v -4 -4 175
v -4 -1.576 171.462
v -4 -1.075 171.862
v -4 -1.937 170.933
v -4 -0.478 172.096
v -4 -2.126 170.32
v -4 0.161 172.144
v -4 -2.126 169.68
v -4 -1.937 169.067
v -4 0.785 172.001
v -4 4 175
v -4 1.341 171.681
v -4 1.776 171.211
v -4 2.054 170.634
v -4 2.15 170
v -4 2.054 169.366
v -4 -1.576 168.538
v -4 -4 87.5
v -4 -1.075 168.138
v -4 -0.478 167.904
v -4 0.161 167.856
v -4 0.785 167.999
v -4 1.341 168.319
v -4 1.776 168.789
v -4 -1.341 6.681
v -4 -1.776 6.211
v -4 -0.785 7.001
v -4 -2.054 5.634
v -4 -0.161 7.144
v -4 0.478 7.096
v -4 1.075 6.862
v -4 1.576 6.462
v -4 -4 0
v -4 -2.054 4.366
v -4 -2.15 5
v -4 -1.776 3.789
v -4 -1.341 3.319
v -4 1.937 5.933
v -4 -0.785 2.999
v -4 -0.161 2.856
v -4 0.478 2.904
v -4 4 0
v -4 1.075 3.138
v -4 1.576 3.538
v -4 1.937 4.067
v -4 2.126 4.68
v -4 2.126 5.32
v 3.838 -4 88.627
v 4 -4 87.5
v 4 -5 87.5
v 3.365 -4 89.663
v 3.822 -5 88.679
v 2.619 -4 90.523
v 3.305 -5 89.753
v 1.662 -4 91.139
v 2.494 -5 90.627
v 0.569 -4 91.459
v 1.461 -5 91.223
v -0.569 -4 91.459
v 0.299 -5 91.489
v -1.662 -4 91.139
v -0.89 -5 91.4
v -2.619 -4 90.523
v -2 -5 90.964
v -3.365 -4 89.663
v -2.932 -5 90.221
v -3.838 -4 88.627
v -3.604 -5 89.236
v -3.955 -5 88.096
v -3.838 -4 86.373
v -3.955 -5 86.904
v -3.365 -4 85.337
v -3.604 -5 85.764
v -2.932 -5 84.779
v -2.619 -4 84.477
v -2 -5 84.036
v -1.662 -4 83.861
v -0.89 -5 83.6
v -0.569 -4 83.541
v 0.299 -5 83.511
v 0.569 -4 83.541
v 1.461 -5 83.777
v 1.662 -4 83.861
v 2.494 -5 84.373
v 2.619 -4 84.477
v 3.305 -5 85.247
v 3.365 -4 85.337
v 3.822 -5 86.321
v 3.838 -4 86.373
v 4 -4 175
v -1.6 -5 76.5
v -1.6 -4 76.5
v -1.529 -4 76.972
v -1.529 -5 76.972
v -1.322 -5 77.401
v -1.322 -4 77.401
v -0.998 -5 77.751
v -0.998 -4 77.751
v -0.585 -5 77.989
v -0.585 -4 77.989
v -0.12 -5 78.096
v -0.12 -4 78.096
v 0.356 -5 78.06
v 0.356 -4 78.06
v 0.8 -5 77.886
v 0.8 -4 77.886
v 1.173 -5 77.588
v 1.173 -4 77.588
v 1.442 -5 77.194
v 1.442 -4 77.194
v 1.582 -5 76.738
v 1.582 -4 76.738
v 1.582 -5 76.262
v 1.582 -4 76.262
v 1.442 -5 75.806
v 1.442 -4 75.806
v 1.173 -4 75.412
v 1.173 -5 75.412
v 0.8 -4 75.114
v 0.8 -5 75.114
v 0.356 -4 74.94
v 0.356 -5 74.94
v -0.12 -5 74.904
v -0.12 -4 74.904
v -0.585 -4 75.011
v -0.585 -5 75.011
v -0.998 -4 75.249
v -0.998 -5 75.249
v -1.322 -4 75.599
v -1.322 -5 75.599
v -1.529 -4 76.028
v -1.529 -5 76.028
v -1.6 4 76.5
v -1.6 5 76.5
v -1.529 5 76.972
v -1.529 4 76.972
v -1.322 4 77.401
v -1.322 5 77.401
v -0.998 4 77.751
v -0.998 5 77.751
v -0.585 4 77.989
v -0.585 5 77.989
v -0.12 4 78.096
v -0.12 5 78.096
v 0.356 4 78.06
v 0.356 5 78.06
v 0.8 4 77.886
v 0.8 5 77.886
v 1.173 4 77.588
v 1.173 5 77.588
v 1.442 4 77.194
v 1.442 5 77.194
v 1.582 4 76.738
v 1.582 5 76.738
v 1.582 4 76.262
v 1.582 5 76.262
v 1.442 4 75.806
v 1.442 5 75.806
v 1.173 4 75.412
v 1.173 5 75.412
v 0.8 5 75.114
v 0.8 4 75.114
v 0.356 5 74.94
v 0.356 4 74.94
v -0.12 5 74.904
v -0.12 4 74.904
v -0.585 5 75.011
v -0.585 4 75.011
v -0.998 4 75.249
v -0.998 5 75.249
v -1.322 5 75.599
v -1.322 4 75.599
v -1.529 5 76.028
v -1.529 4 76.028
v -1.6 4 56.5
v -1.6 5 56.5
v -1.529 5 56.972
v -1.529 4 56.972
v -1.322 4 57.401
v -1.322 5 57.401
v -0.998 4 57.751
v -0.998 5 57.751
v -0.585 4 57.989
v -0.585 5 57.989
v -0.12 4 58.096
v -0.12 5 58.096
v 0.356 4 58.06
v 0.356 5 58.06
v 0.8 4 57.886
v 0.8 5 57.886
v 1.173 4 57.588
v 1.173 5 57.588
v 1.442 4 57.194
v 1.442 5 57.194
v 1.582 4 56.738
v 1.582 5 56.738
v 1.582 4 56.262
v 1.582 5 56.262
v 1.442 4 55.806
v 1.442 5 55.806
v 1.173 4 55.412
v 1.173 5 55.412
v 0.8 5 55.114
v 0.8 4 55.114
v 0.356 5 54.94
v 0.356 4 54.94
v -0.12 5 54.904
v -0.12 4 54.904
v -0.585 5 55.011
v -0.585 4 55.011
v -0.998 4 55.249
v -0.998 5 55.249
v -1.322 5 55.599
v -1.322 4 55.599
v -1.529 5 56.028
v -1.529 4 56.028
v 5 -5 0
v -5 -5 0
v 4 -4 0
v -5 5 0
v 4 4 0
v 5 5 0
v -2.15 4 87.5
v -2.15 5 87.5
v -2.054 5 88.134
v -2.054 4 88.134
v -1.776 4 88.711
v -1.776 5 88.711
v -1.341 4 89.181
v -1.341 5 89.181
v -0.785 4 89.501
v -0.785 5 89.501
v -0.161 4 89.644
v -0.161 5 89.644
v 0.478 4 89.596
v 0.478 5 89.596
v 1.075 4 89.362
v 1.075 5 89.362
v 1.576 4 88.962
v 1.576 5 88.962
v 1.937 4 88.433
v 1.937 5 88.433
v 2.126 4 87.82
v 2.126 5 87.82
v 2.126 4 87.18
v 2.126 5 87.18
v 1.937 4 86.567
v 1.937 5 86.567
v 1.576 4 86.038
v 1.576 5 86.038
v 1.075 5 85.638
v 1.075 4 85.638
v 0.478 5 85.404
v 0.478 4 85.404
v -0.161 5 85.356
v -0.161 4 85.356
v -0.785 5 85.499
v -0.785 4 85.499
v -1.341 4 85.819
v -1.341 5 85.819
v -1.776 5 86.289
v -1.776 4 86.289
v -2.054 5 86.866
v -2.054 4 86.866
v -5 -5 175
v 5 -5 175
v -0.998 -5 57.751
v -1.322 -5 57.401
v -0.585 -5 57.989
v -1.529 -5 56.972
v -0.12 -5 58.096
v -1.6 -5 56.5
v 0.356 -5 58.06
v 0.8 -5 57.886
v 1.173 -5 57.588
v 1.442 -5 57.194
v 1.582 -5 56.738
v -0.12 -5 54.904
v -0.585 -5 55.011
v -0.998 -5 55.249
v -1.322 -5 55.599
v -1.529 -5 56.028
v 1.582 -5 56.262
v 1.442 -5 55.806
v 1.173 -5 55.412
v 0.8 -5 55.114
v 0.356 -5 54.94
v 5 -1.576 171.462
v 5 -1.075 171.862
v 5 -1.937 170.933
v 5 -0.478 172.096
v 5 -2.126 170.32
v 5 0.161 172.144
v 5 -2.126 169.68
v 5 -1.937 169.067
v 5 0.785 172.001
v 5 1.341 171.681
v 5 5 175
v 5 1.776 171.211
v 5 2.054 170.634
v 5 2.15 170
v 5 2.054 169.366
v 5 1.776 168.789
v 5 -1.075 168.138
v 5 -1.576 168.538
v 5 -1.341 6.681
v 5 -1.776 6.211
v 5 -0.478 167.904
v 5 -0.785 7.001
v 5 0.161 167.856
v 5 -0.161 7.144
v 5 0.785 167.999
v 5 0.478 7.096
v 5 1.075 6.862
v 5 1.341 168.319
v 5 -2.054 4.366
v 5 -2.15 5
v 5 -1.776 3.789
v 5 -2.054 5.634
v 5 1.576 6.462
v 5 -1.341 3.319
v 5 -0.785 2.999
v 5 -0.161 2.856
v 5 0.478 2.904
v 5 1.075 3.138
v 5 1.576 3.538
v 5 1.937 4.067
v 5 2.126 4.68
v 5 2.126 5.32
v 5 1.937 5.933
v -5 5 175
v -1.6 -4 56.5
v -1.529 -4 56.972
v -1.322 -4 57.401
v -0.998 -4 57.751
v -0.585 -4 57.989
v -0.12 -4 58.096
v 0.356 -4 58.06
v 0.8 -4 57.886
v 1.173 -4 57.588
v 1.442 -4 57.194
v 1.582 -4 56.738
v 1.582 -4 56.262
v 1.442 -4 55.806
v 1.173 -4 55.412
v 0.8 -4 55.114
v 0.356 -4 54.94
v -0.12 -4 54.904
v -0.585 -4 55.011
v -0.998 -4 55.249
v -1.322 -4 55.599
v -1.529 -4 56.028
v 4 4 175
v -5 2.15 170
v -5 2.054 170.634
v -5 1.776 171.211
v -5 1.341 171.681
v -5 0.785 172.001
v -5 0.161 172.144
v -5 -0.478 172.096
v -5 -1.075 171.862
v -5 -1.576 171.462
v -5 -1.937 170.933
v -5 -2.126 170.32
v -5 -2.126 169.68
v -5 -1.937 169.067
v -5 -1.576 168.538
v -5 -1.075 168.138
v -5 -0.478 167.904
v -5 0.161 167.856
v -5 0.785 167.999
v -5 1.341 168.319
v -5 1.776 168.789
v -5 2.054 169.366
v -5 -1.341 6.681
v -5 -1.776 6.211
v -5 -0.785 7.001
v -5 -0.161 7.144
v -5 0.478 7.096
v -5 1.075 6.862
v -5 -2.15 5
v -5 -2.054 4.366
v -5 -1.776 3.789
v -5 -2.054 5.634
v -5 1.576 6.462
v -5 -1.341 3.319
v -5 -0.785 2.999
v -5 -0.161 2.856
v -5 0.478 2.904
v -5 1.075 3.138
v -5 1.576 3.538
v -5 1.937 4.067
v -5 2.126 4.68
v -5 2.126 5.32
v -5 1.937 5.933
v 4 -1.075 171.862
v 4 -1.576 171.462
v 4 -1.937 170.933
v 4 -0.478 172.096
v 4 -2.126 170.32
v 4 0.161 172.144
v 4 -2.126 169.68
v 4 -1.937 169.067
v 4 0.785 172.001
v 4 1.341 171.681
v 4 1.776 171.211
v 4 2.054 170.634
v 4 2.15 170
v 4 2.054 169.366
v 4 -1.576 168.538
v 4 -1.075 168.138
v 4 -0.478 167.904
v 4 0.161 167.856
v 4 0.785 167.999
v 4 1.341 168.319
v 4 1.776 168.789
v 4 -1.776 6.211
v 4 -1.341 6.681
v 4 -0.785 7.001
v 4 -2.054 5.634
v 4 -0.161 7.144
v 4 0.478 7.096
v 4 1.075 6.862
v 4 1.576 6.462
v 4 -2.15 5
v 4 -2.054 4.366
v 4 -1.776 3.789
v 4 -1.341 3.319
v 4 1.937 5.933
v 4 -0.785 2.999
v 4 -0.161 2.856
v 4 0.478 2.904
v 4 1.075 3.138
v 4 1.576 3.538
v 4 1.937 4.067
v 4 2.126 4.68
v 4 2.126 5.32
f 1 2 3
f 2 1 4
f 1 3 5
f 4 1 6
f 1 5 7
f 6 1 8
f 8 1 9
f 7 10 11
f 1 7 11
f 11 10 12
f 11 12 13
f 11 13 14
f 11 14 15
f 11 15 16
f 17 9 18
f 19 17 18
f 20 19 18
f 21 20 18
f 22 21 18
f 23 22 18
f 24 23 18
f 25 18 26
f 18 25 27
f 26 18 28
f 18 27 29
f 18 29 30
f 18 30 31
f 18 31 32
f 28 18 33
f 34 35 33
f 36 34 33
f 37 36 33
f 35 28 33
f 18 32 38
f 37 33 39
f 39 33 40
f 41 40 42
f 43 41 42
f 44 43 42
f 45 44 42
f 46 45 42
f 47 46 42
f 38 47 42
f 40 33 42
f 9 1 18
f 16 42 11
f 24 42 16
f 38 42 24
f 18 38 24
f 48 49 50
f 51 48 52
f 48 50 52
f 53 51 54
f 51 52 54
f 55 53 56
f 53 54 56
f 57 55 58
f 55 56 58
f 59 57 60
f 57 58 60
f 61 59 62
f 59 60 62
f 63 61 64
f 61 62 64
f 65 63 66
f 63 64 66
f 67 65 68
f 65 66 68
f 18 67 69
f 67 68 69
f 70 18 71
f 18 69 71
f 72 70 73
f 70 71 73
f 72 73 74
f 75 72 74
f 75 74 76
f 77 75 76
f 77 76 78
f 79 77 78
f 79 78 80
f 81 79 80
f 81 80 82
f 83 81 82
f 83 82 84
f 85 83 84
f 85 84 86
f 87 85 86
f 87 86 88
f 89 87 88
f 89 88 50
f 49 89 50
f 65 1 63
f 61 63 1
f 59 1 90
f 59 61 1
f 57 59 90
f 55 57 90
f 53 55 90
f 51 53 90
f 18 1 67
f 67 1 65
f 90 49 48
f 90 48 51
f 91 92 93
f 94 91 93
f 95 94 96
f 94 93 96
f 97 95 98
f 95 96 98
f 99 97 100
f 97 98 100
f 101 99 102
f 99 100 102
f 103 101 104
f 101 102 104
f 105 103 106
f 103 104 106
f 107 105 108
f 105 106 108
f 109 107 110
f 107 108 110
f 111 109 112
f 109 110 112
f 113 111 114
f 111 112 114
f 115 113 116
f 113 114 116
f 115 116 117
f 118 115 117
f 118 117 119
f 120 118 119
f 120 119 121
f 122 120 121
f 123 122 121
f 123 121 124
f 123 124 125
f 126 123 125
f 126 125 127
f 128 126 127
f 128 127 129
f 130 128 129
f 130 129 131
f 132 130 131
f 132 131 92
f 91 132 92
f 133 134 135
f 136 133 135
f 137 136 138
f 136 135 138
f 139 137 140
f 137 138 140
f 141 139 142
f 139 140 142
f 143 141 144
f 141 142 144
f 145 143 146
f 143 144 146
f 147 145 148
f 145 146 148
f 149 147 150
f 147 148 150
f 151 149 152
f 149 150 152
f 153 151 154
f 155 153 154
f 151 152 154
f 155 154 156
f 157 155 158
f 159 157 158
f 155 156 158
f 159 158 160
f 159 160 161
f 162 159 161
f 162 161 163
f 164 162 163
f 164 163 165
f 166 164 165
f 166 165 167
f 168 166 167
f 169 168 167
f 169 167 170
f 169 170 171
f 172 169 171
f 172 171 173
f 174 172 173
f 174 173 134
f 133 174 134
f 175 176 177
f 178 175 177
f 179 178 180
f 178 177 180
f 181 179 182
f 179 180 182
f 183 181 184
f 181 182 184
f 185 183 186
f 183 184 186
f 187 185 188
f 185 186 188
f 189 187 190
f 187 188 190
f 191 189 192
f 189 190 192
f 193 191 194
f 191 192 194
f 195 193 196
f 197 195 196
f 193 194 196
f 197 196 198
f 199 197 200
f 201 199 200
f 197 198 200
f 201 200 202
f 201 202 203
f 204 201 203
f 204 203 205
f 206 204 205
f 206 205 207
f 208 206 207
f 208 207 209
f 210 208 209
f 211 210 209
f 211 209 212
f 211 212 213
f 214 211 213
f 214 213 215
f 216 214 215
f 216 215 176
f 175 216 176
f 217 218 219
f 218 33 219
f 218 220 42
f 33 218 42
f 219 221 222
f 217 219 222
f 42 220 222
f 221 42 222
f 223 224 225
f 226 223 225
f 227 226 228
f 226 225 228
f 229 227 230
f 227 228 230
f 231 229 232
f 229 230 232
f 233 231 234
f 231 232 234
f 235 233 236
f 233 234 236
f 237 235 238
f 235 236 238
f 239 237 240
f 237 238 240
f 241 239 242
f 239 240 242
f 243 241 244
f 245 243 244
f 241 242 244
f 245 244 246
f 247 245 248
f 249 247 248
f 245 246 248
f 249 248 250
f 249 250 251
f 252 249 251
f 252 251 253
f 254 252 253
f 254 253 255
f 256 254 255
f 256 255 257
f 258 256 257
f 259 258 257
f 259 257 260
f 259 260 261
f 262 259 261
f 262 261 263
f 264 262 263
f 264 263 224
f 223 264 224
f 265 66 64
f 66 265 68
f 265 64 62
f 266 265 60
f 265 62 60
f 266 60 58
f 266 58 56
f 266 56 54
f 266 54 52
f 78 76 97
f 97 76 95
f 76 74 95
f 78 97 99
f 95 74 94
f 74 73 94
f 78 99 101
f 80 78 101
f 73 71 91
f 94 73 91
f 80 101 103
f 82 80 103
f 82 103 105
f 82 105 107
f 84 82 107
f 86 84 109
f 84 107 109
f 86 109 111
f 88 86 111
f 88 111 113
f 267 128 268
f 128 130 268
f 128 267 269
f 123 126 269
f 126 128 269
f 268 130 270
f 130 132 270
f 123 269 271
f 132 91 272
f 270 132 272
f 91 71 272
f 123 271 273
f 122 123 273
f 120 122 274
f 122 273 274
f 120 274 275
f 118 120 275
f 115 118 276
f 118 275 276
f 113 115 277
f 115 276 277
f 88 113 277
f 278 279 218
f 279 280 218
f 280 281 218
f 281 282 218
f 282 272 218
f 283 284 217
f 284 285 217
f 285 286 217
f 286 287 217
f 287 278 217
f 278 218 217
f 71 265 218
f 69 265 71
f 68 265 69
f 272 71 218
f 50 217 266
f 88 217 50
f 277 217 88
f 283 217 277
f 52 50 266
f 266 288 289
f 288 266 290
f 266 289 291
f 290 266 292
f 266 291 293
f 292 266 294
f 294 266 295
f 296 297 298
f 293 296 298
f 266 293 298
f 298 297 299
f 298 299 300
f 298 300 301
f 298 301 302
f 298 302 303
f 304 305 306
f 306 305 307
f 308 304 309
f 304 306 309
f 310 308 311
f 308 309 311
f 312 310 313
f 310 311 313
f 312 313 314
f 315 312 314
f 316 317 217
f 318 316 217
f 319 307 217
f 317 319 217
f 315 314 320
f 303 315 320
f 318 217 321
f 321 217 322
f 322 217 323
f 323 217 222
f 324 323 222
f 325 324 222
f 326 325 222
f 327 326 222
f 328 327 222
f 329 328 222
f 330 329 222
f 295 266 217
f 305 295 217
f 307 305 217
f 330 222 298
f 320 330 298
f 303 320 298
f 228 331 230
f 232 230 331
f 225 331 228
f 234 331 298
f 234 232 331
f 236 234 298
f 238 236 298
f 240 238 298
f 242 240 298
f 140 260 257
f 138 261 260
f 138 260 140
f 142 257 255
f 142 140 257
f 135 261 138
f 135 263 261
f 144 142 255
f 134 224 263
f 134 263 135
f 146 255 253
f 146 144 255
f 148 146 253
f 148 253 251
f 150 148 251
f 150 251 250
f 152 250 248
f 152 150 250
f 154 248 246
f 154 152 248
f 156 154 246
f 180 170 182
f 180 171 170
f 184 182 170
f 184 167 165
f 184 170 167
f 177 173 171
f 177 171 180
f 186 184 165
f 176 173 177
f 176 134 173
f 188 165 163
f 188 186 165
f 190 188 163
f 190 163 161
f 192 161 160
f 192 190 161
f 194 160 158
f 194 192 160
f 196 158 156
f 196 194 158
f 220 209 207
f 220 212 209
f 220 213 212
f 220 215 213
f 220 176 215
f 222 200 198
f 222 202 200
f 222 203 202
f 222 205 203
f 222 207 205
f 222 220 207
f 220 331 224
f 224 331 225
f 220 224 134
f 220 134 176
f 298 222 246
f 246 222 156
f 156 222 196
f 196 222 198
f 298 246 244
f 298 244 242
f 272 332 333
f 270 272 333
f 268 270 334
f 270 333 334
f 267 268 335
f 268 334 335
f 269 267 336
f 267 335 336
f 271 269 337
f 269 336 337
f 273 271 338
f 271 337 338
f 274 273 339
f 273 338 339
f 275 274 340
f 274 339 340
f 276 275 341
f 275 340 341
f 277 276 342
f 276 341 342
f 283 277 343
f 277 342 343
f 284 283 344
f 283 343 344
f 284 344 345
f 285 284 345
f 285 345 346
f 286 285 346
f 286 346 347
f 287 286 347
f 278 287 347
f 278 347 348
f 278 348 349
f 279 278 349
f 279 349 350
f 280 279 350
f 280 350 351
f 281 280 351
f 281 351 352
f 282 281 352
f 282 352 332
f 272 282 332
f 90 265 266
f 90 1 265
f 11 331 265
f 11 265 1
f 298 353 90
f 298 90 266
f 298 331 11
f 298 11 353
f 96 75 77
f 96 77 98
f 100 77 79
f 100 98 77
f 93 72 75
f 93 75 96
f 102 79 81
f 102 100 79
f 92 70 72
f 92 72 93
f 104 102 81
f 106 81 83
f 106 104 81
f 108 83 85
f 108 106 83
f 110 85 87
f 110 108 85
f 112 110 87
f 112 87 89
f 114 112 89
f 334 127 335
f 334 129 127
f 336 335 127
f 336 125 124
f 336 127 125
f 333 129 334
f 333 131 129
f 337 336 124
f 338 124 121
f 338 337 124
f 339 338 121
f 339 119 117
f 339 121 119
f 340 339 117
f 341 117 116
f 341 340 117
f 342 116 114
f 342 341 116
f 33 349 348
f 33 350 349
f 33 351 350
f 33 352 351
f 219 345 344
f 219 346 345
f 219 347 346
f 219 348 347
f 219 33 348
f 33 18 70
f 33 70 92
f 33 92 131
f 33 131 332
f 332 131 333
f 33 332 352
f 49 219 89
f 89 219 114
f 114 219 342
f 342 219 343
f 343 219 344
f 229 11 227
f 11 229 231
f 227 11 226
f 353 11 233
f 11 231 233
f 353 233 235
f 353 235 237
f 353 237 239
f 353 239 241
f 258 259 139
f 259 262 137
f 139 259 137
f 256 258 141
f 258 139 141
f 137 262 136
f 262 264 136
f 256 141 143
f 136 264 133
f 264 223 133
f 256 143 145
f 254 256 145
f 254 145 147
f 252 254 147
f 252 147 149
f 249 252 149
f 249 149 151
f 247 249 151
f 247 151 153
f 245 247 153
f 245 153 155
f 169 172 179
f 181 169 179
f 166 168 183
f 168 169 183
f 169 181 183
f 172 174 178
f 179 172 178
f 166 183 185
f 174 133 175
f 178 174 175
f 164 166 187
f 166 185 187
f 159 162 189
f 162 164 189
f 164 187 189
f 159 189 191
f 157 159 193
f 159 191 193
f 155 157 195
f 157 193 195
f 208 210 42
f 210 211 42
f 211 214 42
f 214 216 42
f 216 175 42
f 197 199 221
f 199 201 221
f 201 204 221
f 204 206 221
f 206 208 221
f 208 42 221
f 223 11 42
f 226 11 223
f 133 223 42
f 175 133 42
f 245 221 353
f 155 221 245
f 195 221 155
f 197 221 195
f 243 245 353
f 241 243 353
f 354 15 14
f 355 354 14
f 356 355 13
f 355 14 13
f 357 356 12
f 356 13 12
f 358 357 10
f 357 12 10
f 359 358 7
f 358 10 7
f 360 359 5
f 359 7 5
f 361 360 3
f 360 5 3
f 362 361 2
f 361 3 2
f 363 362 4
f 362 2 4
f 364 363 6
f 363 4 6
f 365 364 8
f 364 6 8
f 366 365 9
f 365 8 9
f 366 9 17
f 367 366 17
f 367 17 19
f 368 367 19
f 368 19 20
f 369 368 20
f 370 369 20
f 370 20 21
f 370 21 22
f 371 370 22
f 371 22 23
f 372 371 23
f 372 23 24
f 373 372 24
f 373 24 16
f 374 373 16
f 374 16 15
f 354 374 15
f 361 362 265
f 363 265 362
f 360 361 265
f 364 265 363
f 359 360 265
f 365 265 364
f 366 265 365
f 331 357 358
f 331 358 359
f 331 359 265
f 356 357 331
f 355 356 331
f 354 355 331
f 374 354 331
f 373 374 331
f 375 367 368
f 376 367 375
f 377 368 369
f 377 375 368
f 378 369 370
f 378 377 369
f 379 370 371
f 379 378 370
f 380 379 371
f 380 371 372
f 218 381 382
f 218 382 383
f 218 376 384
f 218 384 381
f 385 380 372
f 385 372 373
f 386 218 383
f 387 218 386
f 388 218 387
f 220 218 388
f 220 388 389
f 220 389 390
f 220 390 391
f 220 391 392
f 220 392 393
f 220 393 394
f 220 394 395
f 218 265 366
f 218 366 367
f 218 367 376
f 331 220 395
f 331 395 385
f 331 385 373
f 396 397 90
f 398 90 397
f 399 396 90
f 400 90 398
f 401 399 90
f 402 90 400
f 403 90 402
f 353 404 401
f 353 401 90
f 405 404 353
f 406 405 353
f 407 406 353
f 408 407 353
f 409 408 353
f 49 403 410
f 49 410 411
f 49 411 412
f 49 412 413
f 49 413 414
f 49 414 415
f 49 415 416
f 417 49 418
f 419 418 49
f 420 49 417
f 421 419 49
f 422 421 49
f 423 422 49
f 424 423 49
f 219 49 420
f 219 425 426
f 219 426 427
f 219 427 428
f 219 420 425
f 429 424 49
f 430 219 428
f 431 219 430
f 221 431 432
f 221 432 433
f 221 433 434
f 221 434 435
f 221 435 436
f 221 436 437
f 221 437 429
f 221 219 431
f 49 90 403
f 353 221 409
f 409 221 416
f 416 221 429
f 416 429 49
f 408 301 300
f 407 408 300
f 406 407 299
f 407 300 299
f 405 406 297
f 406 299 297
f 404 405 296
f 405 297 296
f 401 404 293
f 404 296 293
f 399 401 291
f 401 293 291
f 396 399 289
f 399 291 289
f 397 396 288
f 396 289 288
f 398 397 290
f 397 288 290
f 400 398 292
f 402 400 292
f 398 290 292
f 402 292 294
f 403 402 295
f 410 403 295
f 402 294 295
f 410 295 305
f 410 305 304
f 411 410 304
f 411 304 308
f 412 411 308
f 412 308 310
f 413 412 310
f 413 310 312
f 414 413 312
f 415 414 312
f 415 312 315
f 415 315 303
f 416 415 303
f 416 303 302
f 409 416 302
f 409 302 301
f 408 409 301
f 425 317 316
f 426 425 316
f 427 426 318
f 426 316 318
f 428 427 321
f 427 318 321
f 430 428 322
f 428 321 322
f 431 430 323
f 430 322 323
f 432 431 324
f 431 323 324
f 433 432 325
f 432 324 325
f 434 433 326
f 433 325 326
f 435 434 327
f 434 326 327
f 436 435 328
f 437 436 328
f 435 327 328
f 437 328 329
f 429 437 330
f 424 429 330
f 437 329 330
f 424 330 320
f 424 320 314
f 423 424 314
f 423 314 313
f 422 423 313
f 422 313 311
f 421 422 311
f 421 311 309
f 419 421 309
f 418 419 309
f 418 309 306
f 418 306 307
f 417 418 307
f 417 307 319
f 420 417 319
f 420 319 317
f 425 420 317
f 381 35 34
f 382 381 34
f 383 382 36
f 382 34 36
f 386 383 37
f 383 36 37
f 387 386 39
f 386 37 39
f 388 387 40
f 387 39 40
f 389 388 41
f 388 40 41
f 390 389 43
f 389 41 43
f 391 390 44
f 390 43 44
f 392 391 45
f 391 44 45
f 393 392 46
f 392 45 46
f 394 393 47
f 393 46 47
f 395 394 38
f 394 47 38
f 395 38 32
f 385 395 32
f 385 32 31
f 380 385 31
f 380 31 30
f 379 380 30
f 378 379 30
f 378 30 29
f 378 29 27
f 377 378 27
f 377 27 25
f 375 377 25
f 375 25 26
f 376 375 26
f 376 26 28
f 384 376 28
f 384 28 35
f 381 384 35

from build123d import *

# Parameters (mm, degrees)
SKETCH_1_W          = 10
SKETCH_1_H          = 10
SKETCH_1_W_2        = 8
SKETCH_1_H_2        = 8
EXTRUDE_1_DEPTH     = 175
SKETCH_2_R          = 2.15
CUT_EXTRUDE_1_DEPTH = 176.356779168
SKETCH_3_R          = 1.6
SKETCH_3_R_2        = 2.15
CUT_EXTRUDE_2_DEPTH = 176.356779168
SKETCH_4_R          = 4
CUT_EXTRUDE_3_DEPTH = 9


with BuildPart() as part:
    # ｽｹｯﾁ1 → 押し出し-薄板1 (new body)
    with BuildSketch(Plane.XY):
        Rectangle(SKETCH_1_W, SKETCH_1_H)
        Rectangle(SKETCH_1_W_2, SKETCH_1_H_2, mode=Mode.SUBTRACT)
    extrude(amount=EXTRUDE_1_DEPTH)

    # ｽｹｯﾁ2 → ｶｯﾄ - 押し出し1 (cut, through all)
    with BuildSketch(Plane(origin=(5, 0, 0), x_dir=(0, 0, -1), z_dir=(1, 0, 0))):
        with Locations(Location((-170, 0, 0), (0, 0, 90))):
            Circle(SKETCH_2_R)
        with Locations(Location((-5, 0, 0), (0, 0, 270))):
            Circle(SKETCH_2_R)
    extrude(amount=-CUT_EXTRUDE_1_DEPTH, mode=Mode.SUBTRACT)

    # ｽｹｯﾁ3 → ｶｯﾄ - 押し出し2 (cut, through all)
    with BuildSketch(Plane(origin=(0, 5, 0), x_dir=(1, 0, 0), z_dir=(0, 1, 0))):
        with Locations(Location((0, -76.5, 0), (0, 0, 180))):
            Circle(SKETCH_3_R)
        with Locations(Location((0, -56.5, 0), (0, 0, 180))):
            Circle(SKETCH_3_R)
        with Locations(Location((0, -87.5, 0), (0, 0, 180))):
            Circle(SKETCH_3_R_2)
    extrude(amount=-CUT_EXTRUDE_2_DEPTH, mode=Mode.SUBTRACT)

    # ｽｹｯﾁ4 → ｶｯﾄ - 押し出し3 (cut)
    with BuildSketch(Plane.XZ.offset(5)):
        with Locations((0, 87.5)):
            Circle(SKETCH_4_R)
    extrude(amount=-CUT_EXTRUDE_3_DEPTH, mode=Mode.SUBTRACT)


solid = part.part
